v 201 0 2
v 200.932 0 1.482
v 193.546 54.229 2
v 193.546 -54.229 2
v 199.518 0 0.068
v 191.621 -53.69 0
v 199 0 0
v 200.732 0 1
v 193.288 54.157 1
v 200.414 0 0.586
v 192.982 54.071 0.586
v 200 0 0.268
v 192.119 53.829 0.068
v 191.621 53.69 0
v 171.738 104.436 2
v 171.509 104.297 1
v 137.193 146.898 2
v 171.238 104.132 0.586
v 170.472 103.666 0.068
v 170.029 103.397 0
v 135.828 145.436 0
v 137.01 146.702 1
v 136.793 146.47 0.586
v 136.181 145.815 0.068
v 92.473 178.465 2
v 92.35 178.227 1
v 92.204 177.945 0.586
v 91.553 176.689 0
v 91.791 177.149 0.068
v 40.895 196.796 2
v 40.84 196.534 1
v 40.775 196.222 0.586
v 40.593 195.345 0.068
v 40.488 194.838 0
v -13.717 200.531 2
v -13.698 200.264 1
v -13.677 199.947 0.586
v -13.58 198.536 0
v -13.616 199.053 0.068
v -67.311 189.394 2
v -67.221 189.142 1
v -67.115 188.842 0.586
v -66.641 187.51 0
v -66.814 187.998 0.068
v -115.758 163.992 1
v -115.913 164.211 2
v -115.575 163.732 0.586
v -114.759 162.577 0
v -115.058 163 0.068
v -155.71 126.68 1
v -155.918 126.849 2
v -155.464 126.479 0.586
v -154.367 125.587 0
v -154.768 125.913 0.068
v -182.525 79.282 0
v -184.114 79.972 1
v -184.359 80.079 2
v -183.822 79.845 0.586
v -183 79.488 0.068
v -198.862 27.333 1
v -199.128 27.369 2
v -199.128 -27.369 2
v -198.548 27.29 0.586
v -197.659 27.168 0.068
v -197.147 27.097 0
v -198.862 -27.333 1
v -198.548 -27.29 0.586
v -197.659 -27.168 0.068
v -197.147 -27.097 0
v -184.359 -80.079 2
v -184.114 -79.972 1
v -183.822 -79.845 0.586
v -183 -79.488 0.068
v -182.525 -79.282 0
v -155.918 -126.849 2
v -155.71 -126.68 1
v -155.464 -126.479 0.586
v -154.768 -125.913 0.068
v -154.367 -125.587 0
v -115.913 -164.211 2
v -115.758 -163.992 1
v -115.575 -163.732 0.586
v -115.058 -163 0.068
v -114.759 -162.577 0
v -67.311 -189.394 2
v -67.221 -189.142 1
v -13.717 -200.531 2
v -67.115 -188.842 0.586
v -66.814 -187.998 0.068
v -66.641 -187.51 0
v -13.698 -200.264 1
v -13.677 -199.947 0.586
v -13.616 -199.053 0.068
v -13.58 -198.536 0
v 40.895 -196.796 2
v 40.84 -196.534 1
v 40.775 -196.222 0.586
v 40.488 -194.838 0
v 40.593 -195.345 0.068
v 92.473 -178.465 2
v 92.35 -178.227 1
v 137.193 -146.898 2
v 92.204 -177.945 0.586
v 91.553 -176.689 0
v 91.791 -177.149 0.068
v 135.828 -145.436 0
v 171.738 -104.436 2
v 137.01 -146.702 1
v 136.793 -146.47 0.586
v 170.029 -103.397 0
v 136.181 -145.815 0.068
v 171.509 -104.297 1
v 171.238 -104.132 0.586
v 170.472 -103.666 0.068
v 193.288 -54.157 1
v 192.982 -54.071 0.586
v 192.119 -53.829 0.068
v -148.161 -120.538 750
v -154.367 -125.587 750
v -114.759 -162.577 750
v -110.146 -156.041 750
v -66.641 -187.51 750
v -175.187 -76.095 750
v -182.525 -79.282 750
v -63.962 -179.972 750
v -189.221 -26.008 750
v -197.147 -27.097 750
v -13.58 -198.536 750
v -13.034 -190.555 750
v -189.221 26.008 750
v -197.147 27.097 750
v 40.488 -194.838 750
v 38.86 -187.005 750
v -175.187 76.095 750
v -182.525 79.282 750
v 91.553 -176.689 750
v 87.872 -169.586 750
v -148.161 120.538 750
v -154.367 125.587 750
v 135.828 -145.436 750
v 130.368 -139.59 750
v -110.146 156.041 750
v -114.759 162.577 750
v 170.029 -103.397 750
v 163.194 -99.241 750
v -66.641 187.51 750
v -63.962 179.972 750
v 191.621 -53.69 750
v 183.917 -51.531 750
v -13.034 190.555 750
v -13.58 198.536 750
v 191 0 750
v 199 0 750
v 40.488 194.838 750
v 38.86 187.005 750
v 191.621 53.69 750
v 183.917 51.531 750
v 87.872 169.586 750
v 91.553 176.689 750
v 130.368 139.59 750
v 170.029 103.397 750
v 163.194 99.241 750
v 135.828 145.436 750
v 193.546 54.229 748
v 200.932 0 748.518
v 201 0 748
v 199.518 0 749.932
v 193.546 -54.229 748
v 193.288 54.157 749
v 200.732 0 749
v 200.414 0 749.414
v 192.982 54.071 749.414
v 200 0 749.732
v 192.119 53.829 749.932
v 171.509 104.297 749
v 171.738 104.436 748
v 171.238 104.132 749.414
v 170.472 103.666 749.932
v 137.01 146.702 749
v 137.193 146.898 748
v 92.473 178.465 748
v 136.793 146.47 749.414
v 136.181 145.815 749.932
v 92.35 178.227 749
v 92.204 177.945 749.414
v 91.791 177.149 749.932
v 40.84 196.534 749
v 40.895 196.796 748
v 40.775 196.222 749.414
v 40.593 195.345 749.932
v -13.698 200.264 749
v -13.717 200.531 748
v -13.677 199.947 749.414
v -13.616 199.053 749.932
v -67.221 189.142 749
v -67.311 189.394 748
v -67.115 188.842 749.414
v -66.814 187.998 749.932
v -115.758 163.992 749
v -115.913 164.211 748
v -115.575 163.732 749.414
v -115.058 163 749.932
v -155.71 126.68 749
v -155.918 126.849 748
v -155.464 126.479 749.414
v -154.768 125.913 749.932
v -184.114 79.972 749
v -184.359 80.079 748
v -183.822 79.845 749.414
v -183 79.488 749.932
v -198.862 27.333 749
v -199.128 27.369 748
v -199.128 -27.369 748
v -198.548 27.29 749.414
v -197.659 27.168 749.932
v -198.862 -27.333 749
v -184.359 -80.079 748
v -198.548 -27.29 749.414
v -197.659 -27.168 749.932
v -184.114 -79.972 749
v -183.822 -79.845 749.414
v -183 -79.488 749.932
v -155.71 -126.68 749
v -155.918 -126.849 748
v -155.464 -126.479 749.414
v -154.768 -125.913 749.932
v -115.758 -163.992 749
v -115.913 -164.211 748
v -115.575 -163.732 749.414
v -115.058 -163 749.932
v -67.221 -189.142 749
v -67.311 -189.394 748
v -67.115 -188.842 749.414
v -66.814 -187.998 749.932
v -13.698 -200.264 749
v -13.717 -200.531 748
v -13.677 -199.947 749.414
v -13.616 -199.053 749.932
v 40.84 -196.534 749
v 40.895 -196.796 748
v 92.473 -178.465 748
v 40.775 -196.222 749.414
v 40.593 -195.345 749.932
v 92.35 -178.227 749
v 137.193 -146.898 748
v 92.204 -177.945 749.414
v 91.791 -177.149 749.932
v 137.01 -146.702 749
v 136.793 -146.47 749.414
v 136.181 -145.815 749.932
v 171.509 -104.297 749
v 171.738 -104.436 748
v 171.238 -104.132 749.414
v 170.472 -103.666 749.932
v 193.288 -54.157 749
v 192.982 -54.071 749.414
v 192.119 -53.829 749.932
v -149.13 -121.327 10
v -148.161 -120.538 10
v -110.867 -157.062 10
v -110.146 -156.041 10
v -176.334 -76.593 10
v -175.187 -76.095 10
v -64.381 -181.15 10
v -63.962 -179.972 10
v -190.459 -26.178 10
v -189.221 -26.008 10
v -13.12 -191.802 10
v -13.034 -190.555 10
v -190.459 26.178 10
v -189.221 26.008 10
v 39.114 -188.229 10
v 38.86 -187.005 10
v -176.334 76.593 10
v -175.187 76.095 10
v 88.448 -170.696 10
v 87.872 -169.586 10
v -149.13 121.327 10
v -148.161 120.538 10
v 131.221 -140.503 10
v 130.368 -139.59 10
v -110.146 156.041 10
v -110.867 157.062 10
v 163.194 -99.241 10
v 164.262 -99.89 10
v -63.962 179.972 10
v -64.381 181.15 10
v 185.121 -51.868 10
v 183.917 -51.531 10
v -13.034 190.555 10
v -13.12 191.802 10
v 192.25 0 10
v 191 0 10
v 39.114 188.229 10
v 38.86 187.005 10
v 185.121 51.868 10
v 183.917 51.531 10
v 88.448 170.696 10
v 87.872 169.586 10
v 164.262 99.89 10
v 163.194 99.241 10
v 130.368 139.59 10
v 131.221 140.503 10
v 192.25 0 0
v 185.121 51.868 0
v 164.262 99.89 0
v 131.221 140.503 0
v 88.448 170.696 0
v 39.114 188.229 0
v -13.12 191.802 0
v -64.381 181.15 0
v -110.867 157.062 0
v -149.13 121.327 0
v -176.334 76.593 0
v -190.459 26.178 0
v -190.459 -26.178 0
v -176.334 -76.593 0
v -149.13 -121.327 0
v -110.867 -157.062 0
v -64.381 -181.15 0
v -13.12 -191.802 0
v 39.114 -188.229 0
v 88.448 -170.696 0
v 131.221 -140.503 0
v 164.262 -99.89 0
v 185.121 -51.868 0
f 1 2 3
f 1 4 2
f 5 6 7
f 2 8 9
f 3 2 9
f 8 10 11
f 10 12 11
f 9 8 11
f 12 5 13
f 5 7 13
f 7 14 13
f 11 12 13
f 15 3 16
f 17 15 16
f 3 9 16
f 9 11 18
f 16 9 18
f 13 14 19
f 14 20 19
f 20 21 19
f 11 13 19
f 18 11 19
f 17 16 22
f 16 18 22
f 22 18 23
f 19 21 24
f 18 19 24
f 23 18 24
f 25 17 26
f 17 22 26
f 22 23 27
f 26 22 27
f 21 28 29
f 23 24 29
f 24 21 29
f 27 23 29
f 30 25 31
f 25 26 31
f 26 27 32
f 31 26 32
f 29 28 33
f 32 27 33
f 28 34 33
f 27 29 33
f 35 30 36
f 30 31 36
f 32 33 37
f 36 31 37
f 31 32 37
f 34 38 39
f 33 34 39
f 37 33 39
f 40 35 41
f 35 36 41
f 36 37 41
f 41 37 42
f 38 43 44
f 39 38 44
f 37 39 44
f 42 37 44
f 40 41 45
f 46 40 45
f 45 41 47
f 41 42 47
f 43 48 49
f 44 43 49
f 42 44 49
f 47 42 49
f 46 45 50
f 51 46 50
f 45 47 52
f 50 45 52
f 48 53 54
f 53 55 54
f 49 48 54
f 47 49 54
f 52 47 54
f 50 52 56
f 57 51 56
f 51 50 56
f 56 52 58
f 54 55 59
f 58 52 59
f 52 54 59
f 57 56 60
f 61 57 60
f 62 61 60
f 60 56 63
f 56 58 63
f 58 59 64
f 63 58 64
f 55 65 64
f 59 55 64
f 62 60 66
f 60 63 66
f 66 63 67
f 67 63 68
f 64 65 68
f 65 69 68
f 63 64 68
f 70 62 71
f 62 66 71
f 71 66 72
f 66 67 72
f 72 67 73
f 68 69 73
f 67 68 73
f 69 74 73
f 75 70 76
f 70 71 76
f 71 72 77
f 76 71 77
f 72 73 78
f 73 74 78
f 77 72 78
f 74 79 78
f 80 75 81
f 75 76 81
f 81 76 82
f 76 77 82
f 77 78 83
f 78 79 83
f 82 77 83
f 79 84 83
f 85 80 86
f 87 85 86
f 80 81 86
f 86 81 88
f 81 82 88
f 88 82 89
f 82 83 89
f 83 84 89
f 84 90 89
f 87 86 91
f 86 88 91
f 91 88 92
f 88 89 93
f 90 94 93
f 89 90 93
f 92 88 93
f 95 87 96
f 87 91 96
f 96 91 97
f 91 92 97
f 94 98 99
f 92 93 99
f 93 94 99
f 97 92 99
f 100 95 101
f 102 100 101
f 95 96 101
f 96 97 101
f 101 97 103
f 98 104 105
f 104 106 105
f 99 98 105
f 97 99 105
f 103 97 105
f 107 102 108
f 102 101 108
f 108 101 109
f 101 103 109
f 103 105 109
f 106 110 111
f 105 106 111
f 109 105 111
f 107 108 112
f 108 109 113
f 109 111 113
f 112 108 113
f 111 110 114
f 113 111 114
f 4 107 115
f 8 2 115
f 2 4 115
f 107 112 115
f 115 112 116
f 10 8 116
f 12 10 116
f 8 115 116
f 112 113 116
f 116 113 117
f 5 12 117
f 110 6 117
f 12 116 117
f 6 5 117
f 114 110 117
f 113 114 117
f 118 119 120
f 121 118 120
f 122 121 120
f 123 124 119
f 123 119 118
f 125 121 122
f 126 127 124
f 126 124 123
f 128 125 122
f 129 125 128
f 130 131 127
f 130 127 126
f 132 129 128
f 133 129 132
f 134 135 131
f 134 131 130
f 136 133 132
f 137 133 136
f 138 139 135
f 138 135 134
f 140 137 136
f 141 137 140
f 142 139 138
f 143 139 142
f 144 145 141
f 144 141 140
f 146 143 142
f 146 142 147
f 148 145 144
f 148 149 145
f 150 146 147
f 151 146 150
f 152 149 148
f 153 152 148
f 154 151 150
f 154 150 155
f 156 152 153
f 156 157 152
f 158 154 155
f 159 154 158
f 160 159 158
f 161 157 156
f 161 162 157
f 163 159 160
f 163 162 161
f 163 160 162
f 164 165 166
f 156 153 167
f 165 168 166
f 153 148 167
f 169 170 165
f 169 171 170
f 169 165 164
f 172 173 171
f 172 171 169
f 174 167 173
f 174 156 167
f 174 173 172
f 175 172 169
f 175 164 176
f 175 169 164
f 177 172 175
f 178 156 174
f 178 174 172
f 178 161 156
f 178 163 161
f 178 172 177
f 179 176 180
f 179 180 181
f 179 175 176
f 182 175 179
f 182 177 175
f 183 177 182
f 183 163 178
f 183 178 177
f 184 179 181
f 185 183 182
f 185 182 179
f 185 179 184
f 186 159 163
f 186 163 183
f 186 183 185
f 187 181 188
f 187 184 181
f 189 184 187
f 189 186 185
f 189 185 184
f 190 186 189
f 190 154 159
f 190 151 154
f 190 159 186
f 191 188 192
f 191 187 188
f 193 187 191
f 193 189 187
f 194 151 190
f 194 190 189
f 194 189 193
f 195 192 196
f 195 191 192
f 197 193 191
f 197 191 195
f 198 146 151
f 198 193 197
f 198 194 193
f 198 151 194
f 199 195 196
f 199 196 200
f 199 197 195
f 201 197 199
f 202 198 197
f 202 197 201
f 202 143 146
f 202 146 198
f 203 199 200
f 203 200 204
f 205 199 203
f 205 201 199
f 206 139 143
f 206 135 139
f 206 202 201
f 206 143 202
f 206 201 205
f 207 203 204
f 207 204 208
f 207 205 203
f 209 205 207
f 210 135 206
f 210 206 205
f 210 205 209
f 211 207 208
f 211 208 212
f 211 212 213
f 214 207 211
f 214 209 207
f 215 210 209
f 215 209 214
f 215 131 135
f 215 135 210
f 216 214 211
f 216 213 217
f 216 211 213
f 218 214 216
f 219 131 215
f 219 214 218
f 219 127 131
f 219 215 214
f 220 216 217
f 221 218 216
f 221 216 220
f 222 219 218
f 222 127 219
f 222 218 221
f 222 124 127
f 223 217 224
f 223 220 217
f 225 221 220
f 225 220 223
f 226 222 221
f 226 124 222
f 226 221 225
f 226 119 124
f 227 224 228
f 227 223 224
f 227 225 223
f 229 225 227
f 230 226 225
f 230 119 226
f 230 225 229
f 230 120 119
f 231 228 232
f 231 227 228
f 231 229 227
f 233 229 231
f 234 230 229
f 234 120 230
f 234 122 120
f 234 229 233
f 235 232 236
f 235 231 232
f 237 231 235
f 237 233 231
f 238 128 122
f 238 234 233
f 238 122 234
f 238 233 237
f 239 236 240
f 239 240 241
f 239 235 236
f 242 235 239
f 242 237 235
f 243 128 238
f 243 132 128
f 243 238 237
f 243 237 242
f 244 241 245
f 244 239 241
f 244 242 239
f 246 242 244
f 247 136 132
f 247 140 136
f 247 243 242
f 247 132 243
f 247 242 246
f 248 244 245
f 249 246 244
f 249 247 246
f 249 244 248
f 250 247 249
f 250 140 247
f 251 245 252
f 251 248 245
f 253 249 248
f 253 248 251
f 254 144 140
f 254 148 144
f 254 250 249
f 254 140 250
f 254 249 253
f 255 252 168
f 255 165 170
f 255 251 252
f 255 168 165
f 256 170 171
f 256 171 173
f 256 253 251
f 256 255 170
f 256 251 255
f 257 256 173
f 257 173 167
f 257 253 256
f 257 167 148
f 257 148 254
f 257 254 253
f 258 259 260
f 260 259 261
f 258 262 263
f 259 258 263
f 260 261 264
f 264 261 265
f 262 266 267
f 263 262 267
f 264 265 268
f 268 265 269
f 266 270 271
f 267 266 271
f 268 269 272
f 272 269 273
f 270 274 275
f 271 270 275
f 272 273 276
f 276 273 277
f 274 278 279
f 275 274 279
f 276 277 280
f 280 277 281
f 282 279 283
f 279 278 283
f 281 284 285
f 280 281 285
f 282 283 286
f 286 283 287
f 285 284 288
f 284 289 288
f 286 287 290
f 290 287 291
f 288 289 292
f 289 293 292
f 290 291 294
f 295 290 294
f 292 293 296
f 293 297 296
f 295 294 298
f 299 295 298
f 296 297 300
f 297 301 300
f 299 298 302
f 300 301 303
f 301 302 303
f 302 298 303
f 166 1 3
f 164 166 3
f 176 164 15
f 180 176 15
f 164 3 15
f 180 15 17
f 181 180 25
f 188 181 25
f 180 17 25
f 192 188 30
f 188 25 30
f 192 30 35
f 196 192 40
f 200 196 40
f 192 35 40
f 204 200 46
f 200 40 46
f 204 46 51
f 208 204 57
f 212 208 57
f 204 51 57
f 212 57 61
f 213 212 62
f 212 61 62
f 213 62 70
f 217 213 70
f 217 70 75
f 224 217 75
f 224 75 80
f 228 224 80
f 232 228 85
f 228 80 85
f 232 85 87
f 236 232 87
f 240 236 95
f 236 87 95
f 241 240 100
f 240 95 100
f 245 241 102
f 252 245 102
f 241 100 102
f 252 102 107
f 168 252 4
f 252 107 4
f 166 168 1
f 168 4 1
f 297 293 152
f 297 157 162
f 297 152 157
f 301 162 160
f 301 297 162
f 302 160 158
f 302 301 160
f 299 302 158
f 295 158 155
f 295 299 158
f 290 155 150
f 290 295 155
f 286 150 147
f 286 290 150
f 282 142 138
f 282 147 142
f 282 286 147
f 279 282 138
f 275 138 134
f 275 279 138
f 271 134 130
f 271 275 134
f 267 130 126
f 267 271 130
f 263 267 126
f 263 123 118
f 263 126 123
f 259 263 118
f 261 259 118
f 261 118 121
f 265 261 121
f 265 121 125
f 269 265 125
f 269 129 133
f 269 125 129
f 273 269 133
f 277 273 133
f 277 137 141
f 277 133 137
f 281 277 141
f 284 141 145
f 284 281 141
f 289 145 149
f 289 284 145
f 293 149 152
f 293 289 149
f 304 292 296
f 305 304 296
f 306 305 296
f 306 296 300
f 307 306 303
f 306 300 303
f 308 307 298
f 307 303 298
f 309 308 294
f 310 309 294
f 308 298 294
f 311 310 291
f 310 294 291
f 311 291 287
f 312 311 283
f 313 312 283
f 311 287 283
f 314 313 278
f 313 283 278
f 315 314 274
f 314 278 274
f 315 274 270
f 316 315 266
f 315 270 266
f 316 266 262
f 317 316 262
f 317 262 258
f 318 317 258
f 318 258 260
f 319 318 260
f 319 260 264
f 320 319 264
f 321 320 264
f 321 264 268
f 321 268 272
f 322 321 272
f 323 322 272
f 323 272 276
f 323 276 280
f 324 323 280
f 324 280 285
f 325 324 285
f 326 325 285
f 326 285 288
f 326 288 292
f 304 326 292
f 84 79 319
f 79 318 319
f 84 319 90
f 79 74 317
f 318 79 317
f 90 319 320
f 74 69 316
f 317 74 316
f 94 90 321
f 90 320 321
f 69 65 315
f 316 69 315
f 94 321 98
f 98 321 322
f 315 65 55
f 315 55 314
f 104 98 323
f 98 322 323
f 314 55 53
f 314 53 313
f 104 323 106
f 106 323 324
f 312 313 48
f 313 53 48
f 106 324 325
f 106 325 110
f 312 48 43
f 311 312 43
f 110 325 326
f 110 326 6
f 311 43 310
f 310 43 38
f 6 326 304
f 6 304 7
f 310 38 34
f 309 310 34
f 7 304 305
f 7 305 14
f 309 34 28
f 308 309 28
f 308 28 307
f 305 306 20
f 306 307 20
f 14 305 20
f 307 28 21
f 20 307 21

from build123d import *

# Parameters (mm, degrees)
SKETCH2_R           = 201
BOSS_EXTRUDE1_DEPTH = 750
SHELL1_T            = -10
SKETCH3_R           = 192.25
CUT_EXTRUDE1_DEPTH  = 793.718108788
FILLET2_R           = 2
FILLET3_R           = 2


with BuildPart() as part:
    # Sketch2 → Boss-Extrude1 (new body)
    with BuildSketch(Plane.XY):
        Circle(SKETCH2_R)
    extrude(amount=BOSS_EXTRUDE1_DEPTH)

    # Shell1
    shell1_openings = [part.faces().sort_by_distance(p)[0] for p in [
        (0, 0, 750),
    ]]
    offset(amount=SHELL1_T, openings=shell1_openings, kind=Kind.INTERSECTION)

    # Sketch3 → Cut-Extrude1 (cut, through all)
    with BuildSketch(Plane.XY.offset(10)):
        Circle(SKETCH3_R)
    extrude(amount=-CUT_EXTRUDE1_DEPTH, mode=Mode.SUBTRACT)

    # Fillet2
    fillet2_edges = [part.edges().sort_by_distance(p)[0] for p in [
        (-201, 0, 0),
    ]]
    fillet(fillet2_edges, radius=FILLET2_R)

    # Fillet3
    fillet3_edges = [part.edges().sort_by_distance(p)[0] for p in [
        (-201, 0, 750),
    ]]
    fillet(fillet3_edges, radius=FILLET3_R)


solid = part.part
